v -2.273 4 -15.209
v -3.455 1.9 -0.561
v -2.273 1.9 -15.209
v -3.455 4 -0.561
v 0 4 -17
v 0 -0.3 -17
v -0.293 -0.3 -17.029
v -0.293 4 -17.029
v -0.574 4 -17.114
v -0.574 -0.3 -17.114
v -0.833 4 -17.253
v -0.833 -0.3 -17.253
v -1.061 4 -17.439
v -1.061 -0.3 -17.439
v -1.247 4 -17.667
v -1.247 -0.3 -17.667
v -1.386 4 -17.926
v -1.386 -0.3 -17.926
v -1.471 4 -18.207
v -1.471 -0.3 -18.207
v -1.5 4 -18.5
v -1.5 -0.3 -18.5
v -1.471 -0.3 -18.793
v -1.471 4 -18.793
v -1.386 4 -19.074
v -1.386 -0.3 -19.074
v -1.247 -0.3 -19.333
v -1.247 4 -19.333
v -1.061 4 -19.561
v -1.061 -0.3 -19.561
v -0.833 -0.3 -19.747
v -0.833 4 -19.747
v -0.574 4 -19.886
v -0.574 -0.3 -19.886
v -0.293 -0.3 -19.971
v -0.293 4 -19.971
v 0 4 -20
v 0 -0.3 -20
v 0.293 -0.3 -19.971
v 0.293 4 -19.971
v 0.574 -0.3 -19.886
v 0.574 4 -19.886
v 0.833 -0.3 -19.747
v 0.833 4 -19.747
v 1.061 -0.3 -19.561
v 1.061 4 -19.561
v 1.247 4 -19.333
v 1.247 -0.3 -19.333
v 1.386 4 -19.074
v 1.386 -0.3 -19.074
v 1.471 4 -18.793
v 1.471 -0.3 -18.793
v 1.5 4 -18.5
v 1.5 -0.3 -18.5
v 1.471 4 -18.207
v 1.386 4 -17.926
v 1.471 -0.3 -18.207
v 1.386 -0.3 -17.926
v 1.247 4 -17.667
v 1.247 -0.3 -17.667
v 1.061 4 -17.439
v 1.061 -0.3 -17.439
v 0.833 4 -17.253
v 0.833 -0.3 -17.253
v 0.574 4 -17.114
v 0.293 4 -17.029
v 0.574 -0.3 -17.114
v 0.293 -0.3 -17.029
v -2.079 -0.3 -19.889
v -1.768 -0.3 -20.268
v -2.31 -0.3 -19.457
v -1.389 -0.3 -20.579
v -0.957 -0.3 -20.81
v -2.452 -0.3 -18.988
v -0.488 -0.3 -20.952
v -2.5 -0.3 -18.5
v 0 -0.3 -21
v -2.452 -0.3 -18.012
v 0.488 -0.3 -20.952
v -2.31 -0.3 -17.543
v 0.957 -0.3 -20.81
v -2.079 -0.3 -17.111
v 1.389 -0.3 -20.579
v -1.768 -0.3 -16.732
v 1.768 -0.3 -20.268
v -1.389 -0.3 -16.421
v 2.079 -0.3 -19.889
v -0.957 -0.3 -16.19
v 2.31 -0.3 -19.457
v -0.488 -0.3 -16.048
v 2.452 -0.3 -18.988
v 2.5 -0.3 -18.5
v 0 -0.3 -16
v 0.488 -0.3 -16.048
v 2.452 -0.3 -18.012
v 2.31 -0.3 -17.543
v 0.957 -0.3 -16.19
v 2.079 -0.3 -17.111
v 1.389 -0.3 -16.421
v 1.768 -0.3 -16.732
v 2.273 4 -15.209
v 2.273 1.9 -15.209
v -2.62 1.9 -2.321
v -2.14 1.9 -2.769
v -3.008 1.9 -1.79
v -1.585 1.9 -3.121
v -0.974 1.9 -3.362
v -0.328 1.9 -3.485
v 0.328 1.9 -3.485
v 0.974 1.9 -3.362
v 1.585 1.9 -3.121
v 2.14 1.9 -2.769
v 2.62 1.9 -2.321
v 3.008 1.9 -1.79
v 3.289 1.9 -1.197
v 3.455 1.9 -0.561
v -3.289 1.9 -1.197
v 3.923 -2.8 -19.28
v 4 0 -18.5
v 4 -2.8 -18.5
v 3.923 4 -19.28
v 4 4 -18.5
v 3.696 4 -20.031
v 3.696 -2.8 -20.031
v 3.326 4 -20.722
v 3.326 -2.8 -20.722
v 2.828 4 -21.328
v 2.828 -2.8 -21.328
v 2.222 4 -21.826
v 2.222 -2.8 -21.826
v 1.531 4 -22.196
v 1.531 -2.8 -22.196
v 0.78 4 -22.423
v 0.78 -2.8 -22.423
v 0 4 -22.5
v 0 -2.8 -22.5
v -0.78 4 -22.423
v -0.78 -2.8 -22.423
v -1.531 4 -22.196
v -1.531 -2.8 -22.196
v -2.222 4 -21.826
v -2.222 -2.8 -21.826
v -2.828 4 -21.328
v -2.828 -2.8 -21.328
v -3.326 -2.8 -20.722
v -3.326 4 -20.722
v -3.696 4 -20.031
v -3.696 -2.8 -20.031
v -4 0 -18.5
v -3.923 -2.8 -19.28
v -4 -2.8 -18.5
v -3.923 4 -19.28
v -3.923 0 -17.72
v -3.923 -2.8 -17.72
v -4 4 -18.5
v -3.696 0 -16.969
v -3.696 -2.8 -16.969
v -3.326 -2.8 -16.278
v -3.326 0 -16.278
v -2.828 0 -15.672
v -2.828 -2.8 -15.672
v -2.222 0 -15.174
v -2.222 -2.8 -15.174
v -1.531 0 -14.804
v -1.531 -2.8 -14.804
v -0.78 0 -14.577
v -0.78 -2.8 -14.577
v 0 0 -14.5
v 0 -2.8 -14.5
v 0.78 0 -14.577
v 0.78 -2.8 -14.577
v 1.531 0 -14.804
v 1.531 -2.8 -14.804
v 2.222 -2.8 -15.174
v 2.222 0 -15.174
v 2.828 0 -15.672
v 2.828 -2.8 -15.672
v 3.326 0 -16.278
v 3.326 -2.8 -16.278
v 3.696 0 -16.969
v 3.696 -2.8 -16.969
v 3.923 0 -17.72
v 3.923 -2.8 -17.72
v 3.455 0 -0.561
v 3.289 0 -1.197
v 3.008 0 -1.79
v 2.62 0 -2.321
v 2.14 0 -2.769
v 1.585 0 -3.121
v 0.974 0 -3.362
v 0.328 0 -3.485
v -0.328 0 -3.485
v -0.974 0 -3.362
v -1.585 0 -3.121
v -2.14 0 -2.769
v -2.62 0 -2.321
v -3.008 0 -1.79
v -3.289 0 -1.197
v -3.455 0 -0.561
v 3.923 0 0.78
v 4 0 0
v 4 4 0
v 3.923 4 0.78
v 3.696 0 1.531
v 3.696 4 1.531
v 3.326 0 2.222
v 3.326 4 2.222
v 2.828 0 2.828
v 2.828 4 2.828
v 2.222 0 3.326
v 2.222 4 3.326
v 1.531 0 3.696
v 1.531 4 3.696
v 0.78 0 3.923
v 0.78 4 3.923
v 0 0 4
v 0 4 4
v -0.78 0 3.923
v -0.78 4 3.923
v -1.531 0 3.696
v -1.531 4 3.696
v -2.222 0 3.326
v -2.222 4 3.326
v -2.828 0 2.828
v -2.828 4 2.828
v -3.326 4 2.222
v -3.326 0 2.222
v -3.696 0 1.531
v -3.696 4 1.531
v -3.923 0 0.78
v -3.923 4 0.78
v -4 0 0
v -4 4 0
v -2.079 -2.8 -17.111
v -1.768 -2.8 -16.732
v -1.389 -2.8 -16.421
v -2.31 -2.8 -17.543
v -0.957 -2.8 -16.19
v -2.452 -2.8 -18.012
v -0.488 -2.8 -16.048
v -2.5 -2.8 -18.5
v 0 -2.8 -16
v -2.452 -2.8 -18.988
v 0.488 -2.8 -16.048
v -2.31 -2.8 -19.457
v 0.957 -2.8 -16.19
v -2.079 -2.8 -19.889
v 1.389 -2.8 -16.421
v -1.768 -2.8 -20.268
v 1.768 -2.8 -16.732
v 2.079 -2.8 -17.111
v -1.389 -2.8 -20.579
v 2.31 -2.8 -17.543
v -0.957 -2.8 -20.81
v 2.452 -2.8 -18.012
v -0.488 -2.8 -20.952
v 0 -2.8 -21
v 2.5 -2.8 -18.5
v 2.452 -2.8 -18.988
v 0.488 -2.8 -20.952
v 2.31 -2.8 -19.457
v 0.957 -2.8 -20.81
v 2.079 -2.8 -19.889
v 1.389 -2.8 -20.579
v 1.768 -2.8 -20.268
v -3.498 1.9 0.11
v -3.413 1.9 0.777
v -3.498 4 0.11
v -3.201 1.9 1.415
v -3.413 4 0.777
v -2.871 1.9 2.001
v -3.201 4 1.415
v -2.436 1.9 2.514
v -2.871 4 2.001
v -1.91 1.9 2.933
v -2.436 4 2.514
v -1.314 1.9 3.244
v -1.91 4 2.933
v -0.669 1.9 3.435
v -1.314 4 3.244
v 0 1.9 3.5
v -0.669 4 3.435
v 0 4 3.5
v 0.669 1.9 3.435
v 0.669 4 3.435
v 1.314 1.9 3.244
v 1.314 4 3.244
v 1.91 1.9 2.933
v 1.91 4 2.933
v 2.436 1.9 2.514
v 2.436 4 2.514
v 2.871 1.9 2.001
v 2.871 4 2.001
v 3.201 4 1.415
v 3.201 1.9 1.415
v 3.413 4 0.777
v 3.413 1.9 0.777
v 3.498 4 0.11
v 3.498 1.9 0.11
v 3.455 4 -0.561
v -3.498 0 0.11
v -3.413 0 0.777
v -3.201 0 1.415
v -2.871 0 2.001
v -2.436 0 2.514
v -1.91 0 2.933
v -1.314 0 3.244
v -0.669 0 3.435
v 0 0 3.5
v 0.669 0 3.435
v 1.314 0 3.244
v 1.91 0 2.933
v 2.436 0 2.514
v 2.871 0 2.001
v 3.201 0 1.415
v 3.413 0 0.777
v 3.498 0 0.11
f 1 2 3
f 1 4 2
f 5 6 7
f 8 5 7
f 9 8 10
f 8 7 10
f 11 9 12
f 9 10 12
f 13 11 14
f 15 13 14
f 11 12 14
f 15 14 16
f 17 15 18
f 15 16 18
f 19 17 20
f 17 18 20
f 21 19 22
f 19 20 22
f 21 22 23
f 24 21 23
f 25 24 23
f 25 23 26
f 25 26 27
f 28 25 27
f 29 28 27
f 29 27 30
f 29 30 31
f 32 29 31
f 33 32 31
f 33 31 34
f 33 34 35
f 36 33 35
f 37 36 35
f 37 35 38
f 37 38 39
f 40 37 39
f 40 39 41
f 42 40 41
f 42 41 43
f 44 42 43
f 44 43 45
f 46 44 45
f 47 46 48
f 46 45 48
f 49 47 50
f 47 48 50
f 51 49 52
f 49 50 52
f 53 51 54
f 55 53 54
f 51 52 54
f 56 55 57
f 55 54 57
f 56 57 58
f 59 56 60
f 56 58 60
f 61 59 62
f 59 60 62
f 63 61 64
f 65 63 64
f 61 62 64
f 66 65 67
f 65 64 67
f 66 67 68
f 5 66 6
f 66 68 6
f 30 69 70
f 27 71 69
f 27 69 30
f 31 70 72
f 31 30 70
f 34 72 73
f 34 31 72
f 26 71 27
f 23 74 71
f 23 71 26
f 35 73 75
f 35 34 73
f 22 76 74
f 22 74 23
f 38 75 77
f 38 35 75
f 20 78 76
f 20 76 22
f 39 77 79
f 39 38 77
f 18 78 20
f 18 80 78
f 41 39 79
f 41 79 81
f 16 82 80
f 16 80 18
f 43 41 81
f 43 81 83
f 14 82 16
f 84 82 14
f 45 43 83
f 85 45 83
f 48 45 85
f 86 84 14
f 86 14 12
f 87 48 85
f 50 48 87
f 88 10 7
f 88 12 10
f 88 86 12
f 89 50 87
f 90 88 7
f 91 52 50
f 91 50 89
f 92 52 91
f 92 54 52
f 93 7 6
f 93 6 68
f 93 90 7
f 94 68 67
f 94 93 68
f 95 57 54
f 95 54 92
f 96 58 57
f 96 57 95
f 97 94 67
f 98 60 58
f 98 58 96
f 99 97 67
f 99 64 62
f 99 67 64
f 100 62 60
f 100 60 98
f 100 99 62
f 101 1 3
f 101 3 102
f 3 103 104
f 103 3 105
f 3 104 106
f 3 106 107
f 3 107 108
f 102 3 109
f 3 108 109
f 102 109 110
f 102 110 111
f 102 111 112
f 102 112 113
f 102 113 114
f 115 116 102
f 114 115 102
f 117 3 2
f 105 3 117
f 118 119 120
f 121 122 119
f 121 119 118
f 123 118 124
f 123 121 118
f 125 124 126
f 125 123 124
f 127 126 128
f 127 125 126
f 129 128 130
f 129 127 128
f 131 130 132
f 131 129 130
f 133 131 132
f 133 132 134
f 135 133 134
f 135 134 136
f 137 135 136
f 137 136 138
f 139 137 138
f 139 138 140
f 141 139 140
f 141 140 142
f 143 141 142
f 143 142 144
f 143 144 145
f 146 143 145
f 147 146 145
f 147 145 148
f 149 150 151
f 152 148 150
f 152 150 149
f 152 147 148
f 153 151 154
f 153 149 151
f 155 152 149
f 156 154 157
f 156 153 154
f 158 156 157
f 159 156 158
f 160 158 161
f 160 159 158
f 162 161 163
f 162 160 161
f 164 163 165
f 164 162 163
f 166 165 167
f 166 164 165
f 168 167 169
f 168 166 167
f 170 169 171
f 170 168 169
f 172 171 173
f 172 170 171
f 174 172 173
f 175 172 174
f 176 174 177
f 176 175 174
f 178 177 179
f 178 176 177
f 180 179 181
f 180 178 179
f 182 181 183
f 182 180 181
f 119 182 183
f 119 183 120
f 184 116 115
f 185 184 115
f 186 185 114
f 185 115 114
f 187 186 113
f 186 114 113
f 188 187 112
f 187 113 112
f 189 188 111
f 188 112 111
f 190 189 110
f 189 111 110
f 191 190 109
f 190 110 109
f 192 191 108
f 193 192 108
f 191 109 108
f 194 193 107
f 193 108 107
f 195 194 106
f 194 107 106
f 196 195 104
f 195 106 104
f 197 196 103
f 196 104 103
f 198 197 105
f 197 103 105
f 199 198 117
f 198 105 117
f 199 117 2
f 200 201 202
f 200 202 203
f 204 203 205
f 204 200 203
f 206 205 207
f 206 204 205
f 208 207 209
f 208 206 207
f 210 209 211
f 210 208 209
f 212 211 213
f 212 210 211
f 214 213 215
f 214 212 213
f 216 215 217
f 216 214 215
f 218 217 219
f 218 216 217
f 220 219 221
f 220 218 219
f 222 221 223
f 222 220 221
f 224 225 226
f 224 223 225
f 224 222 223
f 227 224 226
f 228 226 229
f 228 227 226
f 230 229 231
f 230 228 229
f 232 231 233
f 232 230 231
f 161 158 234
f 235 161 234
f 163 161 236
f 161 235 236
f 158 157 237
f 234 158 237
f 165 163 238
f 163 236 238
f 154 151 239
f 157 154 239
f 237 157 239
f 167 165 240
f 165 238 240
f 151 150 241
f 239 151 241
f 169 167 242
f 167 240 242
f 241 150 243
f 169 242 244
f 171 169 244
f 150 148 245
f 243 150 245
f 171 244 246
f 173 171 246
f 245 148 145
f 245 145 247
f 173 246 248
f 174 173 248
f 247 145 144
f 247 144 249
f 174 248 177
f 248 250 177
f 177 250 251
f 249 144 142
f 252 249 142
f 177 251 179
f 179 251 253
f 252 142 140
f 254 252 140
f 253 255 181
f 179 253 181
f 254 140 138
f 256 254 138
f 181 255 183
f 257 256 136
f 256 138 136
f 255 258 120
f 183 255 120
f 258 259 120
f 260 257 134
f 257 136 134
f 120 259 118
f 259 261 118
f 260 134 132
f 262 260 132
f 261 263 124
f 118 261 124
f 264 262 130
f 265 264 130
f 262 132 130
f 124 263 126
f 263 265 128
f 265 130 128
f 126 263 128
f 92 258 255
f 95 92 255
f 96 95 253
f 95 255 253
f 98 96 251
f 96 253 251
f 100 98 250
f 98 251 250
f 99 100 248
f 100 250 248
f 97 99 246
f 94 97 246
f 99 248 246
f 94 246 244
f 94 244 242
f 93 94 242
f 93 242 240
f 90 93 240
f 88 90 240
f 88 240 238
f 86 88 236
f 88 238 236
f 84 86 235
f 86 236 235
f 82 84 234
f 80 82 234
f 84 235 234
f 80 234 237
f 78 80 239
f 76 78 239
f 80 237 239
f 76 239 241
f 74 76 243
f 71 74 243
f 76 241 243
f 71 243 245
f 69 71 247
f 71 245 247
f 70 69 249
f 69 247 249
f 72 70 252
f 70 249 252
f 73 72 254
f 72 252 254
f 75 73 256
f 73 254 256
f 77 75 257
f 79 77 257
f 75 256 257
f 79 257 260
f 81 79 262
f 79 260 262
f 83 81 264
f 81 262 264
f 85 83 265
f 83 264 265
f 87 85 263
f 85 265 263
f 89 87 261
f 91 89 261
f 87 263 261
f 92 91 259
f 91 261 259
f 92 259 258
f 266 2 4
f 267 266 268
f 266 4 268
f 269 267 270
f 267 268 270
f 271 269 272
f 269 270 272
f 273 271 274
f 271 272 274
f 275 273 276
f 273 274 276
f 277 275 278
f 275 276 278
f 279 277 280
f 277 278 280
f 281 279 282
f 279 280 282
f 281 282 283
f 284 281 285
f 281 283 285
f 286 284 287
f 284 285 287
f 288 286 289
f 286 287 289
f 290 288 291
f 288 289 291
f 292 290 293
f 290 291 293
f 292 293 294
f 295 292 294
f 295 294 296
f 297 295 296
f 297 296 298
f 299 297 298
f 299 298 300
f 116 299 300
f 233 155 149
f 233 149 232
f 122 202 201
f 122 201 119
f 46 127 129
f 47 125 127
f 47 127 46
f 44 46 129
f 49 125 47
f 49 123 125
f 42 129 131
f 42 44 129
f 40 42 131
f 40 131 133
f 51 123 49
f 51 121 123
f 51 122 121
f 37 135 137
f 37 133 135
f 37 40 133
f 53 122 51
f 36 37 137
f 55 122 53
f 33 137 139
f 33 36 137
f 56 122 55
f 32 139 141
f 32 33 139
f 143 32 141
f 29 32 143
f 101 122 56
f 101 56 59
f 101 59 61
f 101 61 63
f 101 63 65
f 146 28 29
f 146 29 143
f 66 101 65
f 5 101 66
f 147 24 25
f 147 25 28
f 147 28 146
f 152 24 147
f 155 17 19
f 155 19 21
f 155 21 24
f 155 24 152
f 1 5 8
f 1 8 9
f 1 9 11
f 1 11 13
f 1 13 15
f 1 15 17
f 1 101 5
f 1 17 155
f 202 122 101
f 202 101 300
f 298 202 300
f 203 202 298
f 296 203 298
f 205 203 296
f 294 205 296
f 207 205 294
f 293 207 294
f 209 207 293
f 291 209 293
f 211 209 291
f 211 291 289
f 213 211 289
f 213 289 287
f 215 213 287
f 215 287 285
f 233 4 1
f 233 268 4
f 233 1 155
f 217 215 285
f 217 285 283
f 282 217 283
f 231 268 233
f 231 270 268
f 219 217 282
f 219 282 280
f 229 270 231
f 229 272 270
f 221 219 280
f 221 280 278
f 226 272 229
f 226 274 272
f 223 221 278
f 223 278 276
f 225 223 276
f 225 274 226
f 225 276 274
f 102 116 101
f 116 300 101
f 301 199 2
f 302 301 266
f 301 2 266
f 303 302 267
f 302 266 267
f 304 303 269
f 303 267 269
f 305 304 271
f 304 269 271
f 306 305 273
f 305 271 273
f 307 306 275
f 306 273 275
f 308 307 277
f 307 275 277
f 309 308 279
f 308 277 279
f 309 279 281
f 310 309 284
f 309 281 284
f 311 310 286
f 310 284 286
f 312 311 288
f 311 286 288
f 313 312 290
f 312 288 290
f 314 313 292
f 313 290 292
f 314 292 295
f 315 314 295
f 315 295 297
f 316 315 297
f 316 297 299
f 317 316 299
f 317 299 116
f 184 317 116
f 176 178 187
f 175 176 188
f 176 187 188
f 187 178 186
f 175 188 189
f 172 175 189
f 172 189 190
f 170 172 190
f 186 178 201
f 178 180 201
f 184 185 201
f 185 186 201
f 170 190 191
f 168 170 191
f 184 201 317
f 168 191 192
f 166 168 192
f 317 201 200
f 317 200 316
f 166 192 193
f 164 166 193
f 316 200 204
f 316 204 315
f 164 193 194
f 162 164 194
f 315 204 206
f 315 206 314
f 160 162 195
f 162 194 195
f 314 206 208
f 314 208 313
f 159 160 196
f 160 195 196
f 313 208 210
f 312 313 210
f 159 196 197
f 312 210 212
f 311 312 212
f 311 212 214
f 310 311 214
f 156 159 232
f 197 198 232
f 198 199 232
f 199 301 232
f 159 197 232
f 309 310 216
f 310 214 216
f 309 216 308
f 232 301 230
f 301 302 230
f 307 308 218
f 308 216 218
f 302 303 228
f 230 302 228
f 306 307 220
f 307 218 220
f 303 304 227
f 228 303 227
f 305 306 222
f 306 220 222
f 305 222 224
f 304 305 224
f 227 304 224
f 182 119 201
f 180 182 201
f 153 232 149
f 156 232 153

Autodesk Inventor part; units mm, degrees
ref_plane "YZ Plane" through (0, 0, 0) normal (1, 0, 0) x (0, 1, 0)
ref_plane "XZ Plane" through (0, 0, 0) normal (0, 1, 0) x (-1, 0, 0)
ref_plane "XY Plane" through (0, 0, 0) normal (0, 0, 1) x (1, 0, 0)
sketch "Эскиз1" plane through (0, 0, 0) normal (0, 1, 0) x (-1, 0, 0)
  circle A0 centre (0, 0) radius 4
  dimension "d0" = 8
extrude "Выдавливание1" add sketch "Эскиз1" along normal blind 4
sketch "Эскиз5" plane through (0, 4, 0) normal (0, 1, 0) x (1, 0, 0)
  circle A0 centre (0, 0) radius 4 projected
  line L0 (-4, 0) -> (4, 0)
  line L1 (4, 0) -> (4, 18.5)
  line L2 (4, 18.5) -> (-4, 18.5)
  line L3 (-4, 18.5) -> (-4, 0)
  circle A1 centre (0, 0) radius 4 projected
  point P0 (4, 0)
  dimension "d27" = 18.5
extrude "Выдавливание4" add sketch "Эскиз5" against normal blind 4 contours A0 L3 L2 L1
sketch "Эскиз9" plane through (0, 4, 0) normal (0, -1, 0) x (1, 0, 0)
  circle A0 centre (0, 0) radius 3.5
  line L0 (3.5, 0) -> (-3.5, 0)
  line L1 (3.5, 0) -> (2.25, -15.5)
  line L2 (-3.5, 0) -> (-2.25, -15.5)
  line L3 (2.25, -15.5) -> (-2.25, -15.5)
  point P0 (0, -15.5)
  point P1 (-3.4548, -0.5609)
  point P2 (3.4548, -0.5609)
  dimension "d43" = 7
  dimension "d44" = 4.5
  dimension "d45" = 15.5
extrude "Выдавливание7" cut sketch "Эскиз9" along normal blind 2.1
sketch "Эскиз10" plane through (0, 1.9, 0) normal (0, 1, 0) x (1, 0, 0)
  line L0 (2.25, 15.5) -> (3.4548, 0.5609) projected
  line L1 (-2.25, 15.5) -> (2.25, 15.5) projected
  line L2 (-3.4548, 0.5609) -> (-2.25, 15.5) projected
  arc A0 (-3.4548, 0.5609) -> (3.4548, 0.5609) centre (0, 0) ccw projected
  arc A1 (-3.4548, 0.5609) -> (3.4548, 0.5609) centre (0, 0) ccw projected
  circle A2 centre (0, 0) radius 3.5
  point P0 (3.4548, 0.5609)
extrude "Выдавливание8" cut sketch "Эскиз10" against normal through all contours A0 A2
sketch "Эскиз6" plane through (0, 4, 0) normal (0, 1, 0) x (1, 0, 0)
  line L0 (-4, 18.5) -> (4, 18.5) projected
  circle A0 centre (0, 18.5) radius 4
  point P0 (0, 0)
  dimension "d30" = 8
extrude "Выдавливание5" add sketch "Эскиз6" against normal blind 6.8
sketch "Эскиз7" plane through (0, -2.8, -18.5) normal (0, -1, 0) x (1, 0, 0)
  arc A0 (-4, 0) -> (4, 0) centre (0, 0) ccw projected
  arc A1 (4, 0) -> (-4, 0) centre (0, 0) ccw projected
  circle A2 centre (0, 0) radius 2.5
  point P0 (0, 18.5)
  point P1 (3.35, -2.1857)
  point P2 (-3.35, -2.1857)
  dimension "d33" = 5
extrude "Выдавливание6" cut sketch "Эскиз7" against normal blind 2.5 contours A2
sketch "Эскиз8" plane through (0, 4, 0) normal (0, 1, 0) x (1, 0, 0)
  circle A0 centre (0, 18.5) radius 2.5 projected
  point P0 (0, 0)
hole "Отверстие2" at (0, 4, -18.5) direction (0, -1, 0) diameter 3 end through all
sketch "Эскиз11" plane through (0, 4, 0) normal (0, 1, 0) x (1, 0, 0)
  line L0 (-3.4548, 0.5609) -> (-2.2735, 15.2089) projected
  line L1 (2.2735, 15.2089) -> (3.4548, 0.5609) projected
  line L2 (-2.2735, 15.2089) -> (2.2735, 15.2089)
  arc A0 (-2.2735, 15.2089) -> (2.2735, 15.2089) centre (0, 18.5) ccw projected
  line L3 (-3.4548, 0.5609) -> (-2.2735, 15.2089) projected
  arc A1 (3.4548, 0.5609) -> (-3.4548, 0.5609) centre (0, 0) ccw projected
  line L4 (2.2735, 15.2089) -> (3.4548, 0.5609) projected
extrude "Выдавливание9" cut sketch "Эскиз11" against normal up to surface (2.1 mm away)
properties part number "Поворотный рычаг для сервы"
